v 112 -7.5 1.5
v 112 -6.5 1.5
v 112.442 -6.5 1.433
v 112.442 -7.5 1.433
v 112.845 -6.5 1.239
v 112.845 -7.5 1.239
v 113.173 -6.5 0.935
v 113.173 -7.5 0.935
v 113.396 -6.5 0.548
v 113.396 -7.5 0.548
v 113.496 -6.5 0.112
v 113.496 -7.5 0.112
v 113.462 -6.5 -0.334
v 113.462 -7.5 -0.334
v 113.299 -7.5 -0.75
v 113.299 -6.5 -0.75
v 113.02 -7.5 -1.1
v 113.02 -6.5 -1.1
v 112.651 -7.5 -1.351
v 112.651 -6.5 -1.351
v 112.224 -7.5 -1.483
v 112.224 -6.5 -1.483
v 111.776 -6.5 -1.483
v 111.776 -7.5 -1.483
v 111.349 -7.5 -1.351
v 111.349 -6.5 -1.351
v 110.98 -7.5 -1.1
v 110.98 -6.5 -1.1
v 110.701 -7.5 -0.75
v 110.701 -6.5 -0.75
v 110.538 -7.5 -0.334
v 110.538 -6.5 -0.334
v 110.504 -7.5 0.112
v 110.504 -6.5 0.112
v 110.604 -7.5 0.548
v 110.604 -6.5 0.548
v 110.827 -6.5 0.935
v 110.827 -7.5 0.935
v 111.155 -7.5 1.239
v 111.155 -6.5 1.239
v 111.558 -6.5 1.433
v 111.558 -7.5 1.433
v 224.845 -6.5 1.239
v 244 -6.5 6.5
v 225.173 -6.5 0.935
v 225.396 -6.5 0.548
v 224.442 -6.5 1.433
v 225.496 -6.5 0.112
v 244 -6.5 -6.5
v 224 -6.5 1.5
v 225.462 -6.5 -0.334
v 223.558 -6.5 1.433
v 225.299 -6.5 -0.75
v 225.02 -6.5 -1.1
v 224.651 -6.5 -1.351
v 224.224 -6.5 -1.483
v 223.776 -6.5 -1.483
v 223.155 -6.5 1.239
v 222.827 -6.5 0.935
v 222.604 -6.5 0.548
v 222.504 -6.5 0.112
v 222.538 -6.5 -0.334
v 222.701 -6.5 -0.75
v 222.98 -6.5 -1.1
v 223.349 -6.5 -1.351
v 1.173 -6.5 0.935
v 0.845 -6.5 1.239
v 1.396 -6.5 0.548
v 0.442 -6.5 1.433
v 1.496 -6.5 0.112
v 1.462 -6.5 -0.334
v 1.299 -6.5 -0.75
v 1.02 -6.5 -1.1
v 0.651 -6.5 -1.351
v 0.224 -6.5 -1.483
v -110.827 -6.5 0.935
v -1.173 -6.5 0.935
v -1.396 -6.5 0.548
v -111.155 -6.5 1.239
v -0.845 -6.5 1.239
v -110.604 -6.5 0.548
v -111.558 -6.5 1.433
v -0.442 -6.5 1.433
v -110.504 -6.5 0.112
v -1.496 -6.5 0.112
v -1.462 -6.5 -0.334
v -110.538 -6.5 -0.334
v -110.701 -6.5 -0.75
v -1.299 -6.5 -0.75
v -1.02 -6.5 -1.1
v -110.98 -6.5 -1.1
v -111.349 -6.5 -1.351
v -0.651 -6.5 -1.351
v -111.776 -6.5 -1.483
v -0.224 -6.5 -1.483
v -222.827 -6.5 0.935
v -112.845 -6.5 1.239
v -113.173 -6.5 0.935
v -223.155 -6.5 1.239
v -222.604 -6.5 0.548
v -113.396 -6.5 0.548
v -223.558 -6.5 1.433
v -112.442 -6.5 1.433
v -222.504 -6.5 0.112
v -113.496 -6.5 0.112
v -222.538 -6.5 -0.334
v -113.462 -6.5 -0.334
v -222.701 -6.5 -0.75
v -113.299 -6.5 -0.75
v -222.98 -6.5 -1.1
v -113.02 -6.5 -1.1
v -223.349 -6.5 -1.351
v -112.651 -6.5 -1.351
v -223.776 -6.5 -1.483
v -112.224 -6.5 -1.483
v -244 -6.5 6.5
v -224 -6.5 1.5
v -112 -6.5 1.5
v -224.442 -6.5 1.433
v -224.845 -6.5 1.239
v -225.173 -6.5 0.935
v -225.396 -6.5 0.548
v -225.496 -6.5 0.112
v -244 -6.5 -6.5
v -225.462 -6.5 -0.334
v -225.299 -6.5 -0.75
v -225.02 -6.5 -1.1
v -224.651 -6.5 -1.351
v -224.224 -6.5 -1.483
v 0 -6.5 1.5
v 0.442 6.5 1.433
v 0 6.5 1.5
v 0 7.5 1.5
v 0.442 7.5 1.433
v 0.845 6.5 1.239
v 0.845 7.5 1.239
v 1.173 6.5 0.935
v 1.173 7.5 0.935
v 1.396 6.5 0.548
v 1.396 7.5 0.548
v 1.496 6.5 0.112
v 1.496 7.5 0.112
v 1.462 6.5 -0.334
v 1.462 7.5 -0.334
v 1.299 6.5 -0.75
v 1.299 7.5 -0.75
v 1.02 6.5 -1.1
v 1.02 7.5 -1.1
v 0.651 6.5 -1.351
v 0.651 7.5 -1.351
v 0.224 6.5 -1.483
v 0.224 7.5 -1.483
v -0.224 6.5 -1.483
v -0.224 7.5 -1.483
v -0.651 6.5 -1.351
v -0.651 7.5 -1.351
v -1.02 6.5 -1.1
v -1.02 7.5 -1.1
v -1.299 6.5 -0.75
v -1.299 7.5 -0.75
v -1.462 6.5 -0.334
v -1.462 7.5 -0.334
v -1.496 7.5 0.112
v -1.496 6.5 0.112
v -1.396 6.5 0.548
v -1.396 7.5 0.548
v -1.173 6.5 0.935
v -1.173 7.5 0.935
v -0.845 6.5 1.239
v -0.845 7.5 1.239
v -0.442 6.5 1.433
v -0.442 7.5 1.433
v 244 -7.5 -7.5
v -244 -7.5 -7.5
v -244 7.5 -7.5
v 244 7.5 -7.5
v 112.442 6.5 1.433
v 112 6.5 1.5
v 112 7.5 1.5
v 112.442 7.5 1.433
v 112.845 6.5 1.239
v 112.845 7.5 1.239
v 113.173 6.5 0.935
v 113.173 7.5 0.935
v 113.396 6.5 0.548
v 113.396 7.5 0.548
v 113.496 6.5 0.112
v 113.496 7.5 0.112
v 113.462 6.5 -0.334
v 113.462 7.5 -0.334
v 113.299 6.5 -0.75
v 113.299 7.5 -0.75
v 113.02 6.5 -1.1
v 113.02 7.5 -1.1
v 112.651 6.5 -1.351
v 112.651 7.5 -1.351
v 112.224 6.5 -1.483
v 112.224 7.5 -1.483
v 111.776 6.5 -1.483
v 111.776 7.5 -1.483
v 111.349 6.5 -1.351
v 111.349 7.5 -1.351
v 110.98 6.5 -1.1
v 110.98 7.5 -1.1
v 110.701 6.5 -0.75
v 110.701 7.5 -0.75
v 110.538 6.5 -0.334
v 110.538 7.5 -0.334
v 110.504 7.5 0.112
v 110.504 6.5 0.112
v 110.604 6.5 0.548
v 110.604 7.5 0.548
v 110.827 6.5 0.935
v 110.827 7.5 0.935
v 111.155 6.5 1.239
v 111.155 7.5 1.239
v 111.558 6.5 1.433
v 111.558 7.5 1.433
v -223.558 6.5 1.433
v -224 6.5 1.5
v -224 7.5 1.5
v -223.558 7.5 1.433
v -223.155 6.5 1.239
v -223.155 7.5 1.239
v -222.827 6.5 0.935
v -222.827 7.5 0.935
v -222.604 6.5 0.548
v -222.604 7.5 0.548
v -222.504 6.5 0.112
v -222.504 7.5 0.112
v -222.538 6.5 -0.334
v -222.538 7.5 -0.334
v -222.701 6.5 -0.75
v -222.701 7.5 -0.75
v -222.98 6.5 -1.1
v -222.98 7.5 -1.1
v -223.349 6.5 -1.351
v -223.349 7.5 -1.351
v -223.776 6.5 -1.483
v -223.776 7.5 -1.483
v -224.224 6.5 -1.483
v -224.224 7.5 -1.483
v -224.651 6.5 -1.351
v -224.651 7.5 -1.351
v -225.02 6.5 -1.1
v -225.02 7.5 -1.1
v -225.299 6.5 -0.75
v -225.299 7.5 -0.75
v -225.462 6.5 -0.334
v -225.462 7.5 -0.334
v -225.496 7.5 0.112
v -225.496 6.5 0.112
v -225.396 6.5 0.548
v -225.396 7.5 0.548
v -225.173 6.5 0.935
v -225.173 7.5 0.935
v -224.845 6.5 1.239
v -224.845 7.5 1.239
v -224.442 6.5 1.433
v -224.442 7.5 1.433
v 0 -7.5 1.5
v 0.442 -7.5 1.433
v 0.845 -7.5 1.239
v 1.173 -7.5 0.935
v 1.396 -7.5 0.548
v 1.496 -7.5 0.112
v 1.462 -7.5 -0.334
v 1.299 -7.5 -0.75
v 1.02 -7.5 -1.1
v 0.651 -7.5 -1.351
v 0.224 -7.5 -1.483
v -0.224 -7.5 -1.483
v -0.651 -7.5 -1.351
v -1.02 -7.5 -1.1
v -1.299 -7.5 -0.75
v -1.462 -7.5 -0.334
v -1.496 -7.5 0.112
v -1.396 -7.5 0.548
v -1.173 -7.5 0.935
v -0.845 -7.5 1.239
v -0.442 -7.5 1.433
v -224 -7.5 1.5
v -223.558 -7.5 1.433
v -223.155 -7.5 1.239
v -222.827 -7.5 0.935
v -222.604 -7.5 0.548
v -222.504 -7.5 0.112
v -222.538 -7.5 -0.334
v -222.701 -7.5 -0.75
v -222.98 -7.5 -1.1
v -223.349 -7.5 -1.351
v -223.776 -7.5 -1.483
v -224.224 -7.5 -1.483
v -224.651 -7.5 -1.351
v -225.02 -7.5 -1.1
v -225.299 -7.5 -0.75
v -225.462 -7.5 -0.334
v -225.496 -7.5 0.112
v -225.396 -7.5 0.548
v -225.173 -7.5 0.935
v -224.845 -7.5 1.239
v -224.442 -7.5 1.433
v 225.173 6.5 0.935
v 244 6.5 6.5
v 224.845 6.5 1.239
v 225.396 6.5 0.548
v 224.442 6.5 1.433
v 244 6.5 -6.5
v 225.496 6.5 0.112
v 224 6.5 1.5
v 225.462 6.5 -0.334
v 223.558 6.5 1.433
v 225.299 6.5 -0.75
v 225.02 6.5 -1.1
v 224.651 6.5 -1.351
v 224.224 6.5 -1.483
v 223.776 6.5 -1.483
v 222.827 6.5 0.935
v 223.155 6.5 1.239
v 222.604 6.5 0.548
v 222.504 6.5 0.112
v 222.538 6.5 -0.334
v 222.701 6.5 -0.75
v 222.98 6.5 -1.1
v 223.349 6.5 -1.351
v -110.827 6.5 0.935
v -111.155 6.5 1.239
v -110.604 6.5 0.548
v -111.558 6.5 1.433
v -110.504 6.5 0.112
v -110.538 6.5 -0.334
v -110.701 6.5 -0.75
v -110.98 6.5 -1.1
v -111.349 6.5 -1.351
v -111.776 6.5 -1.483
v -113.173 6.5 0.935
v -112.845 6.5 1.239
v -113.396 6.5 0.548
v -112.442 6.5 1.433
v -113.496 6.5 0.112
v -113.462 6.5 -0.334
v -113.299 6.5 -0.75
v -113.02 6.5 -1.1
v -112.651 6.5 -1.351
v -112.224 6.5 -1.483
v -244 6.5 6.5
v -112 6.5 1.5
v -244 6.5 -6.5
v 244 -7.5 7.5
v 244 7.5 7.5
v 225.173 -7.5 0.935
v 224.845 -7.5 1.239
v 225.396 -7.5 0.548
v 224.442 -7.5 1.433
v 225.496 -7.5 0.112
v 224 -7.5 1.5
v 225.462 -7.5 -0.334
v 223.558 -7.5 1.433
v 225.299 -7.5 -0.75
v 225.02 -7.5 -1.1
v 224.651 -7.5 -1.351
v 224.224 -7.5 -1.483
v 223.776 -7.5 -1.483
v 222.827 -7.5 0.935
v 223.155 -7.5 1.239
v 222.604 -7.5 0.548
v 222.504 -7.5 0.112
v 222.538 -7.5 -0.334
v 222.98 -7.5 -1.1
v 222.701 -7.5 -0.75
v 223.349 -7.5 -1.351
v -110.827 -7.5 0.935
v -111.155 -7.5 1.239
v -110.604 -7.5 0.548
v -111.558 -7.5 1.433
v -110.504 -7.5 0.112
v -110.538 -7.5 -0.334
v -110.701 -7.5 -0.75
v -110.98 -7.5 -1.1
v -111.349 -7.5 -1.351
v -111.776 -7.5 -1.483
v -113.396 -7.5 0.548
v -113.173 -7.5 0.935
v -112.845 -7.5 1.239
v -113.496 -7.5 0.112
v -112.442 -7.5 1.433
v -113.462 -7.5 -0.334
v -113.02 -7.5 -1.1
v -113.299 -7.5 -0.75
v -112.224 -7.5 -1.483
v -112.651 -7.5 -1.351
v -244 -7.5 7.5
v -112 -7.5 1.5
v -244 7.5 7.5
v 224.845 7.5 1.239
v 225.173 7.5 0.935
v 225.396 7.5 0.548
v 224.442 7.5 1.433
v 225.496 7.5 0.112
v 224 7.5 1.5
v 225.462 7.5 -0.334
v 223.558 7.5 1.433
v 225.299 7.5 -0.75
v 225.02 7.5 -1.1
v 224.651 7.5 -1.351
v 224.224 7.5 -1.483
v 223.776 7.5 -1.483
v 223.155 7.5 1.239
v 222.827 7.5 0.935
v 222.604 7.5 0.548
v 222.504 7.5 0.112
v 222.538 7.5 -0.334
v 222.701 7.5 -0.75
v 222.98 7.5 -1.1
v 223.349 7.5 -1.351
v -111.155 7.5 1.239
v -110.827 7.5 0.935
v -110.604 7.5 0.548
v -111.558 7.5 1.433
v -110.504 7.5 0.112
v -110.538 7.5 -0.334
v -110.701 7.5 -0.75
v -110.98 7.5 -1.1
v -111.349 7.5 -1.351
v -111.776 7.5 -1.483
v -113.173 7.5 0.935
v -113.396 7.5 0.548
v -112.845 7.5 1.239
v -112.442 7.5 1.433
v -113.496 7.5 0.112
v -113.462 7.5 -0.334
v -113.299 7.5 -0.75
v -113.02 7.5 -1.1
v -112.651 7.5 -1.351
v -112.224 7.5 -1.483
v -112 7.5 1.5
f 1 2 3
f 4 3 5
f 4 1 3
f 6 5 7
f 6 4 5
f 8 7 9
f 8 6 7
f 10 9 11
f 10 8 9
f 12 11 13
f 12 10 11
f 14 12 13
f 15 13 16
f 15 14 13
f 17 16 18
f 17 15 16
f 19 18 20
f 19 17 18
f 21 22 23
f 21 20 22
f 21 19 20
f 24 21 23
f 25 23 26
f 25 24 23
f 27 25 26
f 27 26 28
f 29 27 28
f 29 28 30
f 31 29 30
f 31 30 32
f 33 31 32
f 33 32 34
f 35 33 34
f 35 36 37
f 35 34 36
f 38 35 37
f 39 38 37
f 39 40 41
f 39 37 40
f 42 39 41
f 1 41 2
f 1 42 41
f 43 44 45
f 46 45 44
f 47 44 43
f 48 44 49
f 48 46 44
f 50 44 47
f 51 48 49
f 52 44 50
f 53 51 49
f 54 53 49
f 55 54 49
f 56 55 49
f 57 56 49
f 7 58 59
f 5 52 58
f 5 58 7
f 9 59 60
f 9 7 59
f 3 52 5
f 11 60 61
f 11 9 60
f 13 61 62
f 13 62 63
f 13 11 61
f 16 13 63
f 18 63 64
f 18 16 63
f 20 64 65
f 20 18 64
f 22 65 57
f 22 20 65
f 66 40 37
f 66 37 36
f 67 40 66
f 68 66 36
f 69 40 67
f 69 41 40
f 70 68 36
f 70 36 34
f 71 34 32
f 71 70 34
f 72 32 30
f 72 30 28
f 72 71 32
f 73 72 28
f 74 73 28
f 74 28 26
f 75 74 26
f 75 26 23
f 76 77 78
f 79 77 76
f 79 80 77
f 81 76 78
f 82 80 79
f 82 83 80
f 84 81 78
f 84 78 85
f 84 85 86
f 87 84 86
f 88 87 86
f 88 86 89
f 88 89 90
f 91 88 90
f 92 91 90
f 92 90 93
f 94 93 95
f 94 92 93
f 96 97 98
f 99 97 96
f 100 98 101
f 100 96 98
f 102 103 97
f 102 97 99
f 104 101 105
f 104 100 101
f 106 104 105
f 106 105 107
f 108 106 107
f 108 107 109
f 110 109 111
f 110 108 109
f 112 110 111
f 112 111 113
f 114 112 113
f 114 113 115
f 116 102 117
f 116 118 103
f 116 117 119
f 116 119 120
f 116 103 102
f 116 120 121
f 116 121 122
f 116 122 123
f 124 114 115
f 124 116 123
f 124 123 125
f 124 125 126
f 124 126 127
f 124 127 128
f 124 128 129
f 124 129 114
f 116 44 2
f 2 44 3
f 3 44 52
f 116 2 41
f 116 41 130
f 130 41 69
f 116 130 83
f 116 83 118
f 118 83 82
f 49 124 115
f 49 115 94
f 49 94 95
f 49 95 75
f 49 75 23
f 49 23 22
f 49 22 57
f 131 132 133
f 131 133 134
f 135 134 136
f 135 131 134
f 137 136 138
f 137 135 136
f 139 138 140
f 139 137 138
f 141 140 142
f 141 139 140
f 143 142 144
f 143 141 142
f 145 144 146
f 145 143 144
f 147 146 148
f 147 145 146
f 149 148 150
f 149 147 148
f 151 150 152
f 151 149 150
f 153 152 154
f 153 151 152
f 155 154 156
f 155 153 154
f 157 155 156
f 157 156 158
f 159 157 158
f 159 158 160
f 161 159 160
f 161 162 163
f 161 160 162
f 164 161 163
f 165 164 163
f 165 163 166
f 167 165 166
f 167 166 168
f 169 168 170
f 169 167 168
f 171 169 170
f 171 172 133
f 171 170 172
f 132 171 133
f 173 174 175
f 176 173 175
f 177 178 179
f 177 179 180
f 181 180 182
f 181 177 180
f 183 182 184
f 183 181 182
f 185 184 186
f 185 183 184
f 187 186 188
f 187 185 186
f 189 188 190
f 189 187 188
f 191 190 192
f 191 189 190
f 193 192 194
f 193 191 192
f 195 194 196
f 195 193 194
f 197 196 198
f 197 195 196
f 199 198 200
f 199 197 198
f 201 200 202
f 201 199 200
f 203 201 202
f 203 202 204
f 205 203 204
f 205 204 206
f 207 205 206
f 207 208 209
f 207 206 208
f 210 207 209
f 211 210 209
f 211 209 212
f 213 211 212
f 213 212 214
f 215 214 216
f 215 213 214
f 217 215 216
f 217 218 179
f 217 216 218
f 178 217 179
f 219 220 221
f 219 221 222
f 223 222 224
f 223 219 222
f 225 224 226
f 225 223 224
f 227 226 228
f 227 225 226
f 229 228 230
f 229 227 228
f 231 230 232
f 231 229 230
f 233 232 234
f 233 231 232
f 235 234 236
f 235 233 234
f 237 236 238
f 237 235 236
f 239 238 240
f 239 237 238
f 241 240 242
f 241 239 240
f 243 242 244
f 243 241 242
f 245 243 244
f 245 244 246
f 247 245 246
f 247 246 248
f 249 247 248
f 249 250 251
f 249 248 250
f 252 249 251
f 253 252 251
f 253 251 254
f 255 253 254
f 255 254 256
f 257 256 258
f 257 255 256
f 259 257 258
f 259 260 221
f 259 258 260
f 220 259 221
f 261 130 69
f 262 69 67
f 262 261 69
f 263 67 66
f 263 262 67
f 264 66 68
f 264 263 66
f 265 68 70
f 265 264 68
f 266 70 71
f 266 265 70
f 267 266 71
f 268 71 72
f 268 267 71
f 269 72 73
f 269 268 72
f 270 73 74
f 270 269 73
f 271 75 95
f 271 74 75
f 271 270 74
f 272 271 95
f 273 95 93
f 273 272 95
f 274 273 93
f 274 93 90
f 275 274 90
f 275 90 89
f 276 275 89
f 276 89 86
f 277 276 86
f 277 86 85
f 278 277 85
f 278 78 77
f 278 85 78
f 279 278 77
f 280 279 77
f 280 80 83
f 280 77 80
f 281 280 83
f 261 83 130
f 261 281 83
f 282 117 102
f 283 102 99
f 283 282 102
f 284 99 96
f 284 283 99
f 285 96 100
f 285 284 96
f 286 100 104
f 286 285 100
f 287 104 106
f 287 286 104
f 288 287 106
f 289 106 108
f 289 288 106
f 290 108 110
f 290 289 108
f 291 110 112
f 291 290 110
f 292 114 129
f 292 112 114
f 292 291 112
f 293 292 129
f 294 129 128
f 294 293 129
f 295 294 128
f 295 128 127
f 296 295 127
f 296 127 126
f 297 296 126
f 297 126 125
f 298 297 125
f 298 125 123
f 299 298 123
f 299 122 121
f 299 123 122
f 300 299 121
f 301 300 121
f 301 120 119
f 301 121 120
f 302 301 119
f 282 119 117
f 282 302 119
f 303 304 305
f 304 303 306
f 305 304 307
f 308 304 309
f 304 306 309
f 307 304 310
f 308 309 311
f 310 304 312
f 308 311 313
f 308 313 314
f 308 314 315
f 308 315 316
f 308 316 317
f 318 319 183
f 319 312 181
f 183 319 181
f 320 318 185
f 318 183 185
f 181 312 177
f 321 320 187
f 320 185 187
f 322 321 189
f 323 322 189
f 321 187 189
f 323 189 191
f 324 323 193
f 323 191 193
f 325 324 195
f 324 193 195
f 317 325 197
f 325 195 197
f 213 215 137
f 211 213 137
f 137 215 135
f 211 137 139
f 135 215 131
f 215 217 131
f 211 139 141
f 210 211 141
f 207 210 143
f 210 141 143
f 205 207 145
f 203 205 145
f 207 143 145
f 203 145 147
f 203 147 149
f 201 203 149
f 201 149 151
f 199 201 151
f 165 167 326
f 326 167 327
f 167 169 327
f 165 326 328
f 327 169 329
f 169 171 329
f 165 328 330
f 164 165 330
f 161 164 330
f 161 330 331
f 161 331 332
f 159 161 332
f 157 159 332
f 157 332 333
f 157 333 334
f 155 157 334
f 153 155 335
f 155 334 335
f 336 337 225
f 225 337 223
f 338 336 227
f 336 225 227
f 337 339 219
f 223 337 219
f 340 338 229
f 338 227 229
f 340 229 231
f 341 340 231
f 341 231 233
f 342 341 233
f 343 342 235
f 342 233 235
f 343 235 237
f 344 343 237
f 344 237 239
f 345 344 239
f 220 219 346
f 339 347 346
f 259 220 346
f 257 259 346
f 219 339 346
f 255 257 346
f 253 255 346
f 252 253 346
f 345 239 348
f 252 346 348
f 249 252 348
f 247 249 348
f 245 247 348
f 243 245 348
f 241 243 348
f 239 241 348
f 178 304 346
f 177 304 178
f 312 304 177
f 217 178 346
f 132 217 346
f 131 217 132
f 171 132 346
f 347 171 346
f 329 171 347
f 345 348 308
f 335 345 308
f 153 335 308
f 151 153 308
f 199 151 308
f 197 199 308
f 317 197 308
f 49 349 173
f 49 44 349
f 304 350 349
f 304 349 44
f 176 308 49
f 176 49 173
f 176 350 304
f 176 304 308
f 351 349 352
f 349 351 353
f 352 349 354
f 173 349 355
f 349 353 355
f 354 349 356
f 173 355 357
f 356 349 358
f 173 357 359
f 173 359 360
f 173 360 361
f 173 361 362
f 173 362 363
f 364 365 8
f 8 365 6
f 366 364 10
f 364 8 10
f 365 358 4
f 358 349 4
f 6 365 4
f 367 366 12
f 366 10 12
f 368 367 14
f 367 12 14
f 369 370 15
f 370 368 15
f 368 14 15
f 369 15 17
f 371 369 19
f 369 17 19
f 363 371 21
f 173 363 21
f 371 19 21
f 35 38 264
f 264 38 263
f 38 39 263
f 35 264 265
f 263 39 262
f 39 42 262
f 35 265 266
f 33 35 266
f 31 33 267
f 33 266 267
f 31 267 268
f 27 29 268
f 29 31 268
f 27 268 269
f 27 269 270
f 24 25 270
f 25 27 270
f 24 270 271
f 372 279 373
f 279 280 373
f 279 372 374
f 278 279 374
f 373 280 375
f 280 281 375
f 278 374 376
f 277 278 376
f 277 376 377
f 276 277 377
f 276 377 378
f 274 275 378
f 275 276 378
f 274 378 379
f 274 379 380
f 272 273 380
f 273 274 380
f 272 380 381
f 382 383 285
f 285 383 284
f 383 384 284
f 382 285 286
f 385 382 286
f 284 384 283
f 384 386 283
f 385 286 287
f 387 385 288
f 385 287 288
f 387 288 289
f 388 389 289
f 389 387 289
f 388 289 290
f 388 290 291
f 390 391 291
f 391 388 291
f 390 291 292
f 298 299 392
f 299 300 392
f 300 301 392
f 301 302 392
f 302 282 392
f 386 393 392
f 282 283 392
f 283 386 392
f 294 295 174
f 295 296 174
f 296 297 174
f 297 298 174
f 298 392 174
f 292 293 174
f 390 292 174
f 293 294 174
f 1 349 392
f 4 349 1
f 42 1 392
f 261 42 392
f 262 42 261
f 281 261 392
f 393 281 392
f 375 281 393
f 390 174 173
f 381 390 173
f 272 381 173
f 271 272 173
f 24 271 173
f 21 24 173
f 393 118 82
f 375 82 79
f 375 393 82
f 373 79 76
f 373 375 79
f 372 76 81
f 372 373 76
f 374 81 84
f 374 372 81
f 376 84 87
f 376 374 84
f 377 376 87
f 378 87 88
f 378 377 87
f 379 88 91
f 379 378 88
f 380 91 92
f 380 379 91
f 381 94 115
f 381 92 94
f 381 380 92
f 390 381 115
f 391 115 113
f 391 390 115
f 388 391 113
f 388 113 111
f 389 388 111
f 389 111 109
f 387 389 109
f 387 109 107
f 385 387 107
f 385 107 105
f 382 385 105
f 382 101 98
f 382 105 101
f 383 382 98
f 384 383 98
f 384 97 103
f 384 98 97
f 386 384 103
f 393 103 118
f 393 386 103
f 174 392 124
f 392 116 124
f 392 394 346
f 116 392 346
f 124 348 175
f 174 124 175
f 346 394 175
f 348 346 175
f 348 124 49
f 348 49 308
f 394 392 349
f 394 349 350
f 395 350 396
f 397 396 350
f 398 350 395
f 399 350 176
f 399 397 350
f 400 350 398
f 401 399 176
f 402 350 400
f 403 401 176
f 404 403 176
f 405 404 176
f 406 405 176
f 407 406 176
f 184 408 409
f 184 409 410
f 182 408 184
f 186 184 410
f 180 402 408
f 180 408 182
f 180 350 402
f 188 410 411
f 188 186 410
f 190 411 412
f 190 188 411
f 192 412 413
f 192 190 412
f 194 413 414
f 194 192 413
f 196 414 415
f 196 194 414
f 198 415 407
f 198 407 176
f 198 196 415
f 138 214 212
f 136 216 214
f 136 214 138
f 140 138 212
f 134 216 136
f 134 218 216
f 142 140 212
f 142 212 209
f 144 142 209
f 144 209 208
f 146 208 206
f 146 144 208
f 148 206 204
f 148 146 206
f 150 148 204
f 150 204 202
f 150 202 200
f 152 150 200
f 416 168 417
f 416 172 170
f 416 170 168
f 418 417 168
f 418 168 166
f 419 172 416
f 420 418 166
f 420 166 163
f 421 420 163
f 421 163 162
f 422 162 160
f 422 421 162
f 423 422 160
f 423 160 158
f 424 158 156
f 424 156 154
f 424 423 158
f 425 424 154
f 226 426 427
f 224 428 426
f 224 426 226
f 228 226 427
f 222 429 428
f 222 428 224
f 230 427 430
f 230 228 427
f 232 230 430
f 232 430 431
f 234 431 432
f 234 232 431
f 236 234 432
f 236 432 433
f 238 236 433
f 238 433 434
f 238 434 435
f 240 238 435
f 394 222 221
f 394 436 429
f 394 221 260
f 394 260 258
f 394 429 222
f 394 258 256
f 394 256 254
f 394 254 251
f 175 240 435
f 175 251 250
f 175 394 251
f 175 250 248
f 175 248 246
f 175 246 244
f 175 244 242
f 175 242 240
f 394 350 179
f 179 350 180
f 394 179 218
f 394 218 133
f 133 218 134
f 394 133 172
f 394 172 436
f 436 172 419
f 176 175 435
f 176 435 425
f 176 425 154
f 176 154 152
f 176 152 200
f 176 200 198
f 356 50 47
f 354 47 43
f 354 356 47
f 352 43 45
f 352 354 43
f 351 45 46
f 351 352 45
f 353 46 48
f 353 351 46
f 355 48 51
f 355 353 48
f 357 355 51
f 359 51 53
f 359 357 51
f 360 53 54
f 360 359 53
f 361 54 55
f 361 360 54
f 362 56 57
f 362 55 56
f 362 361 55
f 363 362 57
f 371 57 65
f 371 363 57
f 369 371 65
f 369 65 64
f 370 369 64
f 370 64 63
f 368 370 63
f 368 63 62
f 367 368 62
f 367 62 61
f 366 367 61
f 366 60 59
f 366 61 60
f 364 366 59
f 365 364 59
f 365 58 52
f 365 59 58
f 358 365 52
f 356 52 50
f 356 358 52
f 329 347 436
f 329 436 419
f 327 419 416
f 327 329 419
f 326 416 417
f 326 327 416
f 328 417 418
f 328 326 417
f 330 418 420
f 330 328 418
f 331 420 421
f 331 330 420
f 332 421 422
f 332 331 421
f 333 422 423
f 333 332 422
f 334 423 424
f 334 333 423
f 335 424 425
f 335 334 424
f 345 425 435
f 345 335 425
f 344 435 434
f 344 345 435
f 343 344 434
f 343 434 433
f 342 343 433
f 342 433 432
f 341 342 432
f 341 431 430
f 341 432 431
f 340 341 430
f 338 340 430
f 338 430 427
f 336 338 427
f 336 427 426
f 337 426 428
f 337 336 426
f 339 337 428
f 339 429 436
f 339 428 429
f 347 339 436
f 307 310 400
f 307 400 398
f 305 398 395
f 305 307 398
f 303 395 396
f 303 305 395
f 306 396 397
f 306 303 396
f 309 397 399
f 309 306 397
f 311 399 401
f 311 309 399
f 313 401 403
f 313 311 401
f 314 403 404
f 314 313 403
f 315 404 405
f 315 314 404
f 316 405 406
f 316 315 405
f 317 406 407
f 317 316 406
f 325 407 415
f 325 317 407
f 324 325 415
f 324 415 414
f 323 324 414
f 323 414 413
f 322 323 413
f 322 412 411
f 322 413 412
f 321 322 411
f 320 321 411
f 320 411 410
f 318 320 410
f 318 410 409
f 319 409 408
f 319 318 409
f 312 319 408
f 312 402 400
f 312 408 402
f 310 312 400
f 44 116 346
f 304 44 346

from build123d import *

# Parameters (mm, degrees)
SKETCH_21_W         = 15
SKETCH_21_H         = 15
SKETCH_21_W_2       = 13
SKETCH_21_H_2       = 13
F_15X15X1_1_DEPTH   = 488
SKETCH_3_R          = 1.5
CUT_EXTRUDE_1_DEPTH = 245.575652917


with BuildPart() as part:
    # 草图21 → 矩形管 方铝管15X15X1(1) (new body)
    with BuildSketch(Plane(origin=(-244, 0, 0), x_dir=(0, 0, -1), z_dir=(1, 0, 0))):
        Rectangle(SKETCH_21_W, SKETCH_21_H)
        Rectangle(SKETCH_21_W_2, SKETCH_21_H_2, mode=Mode.SUBTRACT)
    extrude(amount=F_15X15X1_1_DEPTH)

    # 草图3 → 切除-拉伸1 (cut, through all)
    with BuildSketch(Plane(origin=(0, -7.5, 0), x_dir=(1, 0, 0), z_dir=(0, 1, 0))):
        with Locations(Location((-224, 0, 0), (0, 0, 270))):
            Circle(SKETCH_3_R)
        with Locations(Location((-112, 0, 0), (0, 0, 270))):
            Circle(SKETCH_3_R)
        with Locations(Location((0, 0, 0), (0, 0, 270))):
            Circle(SKETCH_3_R)
        with Locations(Location((112, 0, 0), (0, 0, 270))):
            Circle(SKETCH_3_R)
        with Locations(Location((224, 0, 0), (0, 0, 270))):
            Circle(SKETCH_3_R)
    extrude(amount=CUT_EXTRUDE_1_DEPTH, mode=Mode.SUBTRACT)


solid = part.part
